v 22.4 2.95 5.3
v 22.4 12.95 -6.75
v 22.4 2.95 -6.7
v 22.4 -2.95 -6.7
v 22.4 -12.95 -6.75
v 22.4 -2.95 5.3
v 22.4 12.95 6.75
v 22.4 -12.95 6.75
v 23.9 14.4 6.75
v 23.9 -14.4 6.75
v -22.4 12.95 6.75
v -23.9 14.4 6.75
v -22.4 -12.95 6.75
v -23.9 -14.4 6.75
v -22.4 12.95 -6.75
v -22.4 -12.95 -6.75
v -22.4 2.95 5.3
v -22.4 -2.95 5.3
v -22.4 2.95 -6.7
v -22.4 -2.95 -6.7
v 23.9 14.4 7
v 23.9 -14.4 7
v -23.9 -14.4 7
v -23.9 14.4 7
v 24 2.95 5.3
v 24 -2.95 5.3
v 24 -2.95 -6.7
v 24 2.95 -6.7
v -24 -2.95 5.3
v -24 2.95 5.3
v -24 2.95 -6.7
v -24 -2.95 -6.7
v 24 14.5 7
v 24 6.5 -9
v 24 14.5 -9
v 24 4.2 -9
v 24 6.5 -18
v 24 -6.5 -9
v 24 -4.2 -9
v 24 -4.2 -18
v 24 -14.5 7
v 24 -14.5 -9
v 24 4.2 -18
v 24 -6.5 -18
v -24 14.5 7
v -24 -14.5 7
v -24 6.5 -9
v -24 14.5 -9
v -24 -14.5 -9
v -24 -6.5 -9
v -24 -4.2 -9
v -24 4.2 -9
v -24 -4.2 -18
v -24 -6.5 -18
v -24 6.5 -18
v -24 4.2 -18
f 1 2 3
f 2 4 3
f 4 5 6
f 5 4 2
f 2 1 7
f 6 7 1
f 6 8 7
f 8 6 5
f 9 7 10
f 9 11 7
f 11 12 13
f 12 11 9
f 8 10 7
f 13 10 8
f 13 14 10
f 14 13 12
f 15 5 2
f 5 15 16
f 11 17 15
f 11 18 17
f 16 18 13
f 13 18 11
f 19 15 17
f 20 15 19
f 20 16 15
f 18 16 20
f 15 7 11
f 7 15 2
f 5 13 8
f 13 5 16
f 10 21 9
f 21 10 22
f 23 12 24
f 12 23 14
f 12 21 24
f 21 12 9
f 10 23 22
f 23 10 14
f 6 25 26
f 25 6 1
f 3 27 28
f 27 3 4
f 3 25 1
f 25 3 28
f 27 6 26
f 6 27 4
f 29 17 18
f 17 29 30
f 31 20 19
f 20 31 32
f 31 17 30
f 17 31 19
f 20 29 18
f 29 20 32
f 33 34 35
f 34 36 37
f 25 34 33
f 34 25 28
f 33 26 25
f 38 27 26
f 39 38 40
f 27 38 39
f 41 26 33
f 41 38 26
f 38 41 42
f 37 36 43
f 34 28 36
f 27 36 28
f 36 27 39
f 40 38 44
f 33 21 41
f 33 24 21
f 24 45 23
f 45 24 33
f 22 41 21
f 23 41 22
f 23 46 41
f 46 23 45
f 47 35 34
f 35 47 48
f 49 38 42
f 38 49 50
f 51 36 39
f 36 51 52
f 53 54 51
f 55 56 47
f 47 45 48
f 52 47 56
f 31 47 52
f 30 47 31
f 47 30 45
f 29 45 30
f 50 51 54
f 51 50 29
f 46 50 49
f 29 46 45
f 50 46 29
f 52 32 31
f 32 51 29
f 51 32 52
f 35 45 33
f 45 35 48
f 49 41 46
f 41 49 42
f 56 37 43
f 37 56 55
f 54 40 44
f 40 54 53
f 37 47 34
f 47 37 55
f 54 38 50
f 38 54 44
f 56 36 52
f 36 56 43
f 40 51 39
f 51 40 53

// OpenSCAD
// file: ../Parts/rounder.scad
// rounder.scad
// cutting tool for rounding off corners with a cylinder

//---------------------
module rounder(
r=10,   // radius
h=10,   // height
f=22,    // $fn
extra=0.01  // extra size for the cube
){

difference(){
  translate([-extra,-extra,-extra])
  cube([r+extra,r+extra,h+2*extra]);
  translate([r,r,-1])
  cylinder(r=r,h=h+2,$fn=f);
}

}

//---------------------------------------------------------------------------
module bevel(x=1,y=1,h=10){

linear_extrude(height=h)
polygon(points=[[0,0],[x,0],[0,y]]);
    
}
  

//========================

rounder();

//========================
// main file
//======================================================================
// HumidClip.scad
//
// clip to add humidity sensor to the big drybox.
//
// DrTomFlint, 19 Jan 2025
//======================================================================

use <../Parts/rounder.scad>
use <../Parts/threads.scad>

F1=200;
F2=77;

//----------------------------------------------------------------------
module sensor(){

  cube([44.8,25.9,13.5],center=true);
  translate([0,0,13.5/2+1.9/2])
  cube([47.8,28.8,1.9],center=true);
  
  // side clips
  translate([44.6/2+1.8/2,0,-0.7])
  cube([1.8,5.9,12.0],center=true);
  translate([-44.6/2-1.8/2,0,-0.7])
  cube([1.8,5.9,12.0],center=true);
  
}
//----------------------------------------------------------------------
module clip(){

  // around the sensor
  difference(){
    translate([0,0,-1])
    cube([48,29,16],center=true);
    
    sensor();
  }
  // on the divider wall
  difference(){
    translate([0,0,-8-5])
    cube([48,13,10],center=true);
    
    translate([0,0,-8-5])
    cube([48,8.4,10],center=true);
  }


}


//======================================================================

//~ sensor();

clip();

//======================================================================
